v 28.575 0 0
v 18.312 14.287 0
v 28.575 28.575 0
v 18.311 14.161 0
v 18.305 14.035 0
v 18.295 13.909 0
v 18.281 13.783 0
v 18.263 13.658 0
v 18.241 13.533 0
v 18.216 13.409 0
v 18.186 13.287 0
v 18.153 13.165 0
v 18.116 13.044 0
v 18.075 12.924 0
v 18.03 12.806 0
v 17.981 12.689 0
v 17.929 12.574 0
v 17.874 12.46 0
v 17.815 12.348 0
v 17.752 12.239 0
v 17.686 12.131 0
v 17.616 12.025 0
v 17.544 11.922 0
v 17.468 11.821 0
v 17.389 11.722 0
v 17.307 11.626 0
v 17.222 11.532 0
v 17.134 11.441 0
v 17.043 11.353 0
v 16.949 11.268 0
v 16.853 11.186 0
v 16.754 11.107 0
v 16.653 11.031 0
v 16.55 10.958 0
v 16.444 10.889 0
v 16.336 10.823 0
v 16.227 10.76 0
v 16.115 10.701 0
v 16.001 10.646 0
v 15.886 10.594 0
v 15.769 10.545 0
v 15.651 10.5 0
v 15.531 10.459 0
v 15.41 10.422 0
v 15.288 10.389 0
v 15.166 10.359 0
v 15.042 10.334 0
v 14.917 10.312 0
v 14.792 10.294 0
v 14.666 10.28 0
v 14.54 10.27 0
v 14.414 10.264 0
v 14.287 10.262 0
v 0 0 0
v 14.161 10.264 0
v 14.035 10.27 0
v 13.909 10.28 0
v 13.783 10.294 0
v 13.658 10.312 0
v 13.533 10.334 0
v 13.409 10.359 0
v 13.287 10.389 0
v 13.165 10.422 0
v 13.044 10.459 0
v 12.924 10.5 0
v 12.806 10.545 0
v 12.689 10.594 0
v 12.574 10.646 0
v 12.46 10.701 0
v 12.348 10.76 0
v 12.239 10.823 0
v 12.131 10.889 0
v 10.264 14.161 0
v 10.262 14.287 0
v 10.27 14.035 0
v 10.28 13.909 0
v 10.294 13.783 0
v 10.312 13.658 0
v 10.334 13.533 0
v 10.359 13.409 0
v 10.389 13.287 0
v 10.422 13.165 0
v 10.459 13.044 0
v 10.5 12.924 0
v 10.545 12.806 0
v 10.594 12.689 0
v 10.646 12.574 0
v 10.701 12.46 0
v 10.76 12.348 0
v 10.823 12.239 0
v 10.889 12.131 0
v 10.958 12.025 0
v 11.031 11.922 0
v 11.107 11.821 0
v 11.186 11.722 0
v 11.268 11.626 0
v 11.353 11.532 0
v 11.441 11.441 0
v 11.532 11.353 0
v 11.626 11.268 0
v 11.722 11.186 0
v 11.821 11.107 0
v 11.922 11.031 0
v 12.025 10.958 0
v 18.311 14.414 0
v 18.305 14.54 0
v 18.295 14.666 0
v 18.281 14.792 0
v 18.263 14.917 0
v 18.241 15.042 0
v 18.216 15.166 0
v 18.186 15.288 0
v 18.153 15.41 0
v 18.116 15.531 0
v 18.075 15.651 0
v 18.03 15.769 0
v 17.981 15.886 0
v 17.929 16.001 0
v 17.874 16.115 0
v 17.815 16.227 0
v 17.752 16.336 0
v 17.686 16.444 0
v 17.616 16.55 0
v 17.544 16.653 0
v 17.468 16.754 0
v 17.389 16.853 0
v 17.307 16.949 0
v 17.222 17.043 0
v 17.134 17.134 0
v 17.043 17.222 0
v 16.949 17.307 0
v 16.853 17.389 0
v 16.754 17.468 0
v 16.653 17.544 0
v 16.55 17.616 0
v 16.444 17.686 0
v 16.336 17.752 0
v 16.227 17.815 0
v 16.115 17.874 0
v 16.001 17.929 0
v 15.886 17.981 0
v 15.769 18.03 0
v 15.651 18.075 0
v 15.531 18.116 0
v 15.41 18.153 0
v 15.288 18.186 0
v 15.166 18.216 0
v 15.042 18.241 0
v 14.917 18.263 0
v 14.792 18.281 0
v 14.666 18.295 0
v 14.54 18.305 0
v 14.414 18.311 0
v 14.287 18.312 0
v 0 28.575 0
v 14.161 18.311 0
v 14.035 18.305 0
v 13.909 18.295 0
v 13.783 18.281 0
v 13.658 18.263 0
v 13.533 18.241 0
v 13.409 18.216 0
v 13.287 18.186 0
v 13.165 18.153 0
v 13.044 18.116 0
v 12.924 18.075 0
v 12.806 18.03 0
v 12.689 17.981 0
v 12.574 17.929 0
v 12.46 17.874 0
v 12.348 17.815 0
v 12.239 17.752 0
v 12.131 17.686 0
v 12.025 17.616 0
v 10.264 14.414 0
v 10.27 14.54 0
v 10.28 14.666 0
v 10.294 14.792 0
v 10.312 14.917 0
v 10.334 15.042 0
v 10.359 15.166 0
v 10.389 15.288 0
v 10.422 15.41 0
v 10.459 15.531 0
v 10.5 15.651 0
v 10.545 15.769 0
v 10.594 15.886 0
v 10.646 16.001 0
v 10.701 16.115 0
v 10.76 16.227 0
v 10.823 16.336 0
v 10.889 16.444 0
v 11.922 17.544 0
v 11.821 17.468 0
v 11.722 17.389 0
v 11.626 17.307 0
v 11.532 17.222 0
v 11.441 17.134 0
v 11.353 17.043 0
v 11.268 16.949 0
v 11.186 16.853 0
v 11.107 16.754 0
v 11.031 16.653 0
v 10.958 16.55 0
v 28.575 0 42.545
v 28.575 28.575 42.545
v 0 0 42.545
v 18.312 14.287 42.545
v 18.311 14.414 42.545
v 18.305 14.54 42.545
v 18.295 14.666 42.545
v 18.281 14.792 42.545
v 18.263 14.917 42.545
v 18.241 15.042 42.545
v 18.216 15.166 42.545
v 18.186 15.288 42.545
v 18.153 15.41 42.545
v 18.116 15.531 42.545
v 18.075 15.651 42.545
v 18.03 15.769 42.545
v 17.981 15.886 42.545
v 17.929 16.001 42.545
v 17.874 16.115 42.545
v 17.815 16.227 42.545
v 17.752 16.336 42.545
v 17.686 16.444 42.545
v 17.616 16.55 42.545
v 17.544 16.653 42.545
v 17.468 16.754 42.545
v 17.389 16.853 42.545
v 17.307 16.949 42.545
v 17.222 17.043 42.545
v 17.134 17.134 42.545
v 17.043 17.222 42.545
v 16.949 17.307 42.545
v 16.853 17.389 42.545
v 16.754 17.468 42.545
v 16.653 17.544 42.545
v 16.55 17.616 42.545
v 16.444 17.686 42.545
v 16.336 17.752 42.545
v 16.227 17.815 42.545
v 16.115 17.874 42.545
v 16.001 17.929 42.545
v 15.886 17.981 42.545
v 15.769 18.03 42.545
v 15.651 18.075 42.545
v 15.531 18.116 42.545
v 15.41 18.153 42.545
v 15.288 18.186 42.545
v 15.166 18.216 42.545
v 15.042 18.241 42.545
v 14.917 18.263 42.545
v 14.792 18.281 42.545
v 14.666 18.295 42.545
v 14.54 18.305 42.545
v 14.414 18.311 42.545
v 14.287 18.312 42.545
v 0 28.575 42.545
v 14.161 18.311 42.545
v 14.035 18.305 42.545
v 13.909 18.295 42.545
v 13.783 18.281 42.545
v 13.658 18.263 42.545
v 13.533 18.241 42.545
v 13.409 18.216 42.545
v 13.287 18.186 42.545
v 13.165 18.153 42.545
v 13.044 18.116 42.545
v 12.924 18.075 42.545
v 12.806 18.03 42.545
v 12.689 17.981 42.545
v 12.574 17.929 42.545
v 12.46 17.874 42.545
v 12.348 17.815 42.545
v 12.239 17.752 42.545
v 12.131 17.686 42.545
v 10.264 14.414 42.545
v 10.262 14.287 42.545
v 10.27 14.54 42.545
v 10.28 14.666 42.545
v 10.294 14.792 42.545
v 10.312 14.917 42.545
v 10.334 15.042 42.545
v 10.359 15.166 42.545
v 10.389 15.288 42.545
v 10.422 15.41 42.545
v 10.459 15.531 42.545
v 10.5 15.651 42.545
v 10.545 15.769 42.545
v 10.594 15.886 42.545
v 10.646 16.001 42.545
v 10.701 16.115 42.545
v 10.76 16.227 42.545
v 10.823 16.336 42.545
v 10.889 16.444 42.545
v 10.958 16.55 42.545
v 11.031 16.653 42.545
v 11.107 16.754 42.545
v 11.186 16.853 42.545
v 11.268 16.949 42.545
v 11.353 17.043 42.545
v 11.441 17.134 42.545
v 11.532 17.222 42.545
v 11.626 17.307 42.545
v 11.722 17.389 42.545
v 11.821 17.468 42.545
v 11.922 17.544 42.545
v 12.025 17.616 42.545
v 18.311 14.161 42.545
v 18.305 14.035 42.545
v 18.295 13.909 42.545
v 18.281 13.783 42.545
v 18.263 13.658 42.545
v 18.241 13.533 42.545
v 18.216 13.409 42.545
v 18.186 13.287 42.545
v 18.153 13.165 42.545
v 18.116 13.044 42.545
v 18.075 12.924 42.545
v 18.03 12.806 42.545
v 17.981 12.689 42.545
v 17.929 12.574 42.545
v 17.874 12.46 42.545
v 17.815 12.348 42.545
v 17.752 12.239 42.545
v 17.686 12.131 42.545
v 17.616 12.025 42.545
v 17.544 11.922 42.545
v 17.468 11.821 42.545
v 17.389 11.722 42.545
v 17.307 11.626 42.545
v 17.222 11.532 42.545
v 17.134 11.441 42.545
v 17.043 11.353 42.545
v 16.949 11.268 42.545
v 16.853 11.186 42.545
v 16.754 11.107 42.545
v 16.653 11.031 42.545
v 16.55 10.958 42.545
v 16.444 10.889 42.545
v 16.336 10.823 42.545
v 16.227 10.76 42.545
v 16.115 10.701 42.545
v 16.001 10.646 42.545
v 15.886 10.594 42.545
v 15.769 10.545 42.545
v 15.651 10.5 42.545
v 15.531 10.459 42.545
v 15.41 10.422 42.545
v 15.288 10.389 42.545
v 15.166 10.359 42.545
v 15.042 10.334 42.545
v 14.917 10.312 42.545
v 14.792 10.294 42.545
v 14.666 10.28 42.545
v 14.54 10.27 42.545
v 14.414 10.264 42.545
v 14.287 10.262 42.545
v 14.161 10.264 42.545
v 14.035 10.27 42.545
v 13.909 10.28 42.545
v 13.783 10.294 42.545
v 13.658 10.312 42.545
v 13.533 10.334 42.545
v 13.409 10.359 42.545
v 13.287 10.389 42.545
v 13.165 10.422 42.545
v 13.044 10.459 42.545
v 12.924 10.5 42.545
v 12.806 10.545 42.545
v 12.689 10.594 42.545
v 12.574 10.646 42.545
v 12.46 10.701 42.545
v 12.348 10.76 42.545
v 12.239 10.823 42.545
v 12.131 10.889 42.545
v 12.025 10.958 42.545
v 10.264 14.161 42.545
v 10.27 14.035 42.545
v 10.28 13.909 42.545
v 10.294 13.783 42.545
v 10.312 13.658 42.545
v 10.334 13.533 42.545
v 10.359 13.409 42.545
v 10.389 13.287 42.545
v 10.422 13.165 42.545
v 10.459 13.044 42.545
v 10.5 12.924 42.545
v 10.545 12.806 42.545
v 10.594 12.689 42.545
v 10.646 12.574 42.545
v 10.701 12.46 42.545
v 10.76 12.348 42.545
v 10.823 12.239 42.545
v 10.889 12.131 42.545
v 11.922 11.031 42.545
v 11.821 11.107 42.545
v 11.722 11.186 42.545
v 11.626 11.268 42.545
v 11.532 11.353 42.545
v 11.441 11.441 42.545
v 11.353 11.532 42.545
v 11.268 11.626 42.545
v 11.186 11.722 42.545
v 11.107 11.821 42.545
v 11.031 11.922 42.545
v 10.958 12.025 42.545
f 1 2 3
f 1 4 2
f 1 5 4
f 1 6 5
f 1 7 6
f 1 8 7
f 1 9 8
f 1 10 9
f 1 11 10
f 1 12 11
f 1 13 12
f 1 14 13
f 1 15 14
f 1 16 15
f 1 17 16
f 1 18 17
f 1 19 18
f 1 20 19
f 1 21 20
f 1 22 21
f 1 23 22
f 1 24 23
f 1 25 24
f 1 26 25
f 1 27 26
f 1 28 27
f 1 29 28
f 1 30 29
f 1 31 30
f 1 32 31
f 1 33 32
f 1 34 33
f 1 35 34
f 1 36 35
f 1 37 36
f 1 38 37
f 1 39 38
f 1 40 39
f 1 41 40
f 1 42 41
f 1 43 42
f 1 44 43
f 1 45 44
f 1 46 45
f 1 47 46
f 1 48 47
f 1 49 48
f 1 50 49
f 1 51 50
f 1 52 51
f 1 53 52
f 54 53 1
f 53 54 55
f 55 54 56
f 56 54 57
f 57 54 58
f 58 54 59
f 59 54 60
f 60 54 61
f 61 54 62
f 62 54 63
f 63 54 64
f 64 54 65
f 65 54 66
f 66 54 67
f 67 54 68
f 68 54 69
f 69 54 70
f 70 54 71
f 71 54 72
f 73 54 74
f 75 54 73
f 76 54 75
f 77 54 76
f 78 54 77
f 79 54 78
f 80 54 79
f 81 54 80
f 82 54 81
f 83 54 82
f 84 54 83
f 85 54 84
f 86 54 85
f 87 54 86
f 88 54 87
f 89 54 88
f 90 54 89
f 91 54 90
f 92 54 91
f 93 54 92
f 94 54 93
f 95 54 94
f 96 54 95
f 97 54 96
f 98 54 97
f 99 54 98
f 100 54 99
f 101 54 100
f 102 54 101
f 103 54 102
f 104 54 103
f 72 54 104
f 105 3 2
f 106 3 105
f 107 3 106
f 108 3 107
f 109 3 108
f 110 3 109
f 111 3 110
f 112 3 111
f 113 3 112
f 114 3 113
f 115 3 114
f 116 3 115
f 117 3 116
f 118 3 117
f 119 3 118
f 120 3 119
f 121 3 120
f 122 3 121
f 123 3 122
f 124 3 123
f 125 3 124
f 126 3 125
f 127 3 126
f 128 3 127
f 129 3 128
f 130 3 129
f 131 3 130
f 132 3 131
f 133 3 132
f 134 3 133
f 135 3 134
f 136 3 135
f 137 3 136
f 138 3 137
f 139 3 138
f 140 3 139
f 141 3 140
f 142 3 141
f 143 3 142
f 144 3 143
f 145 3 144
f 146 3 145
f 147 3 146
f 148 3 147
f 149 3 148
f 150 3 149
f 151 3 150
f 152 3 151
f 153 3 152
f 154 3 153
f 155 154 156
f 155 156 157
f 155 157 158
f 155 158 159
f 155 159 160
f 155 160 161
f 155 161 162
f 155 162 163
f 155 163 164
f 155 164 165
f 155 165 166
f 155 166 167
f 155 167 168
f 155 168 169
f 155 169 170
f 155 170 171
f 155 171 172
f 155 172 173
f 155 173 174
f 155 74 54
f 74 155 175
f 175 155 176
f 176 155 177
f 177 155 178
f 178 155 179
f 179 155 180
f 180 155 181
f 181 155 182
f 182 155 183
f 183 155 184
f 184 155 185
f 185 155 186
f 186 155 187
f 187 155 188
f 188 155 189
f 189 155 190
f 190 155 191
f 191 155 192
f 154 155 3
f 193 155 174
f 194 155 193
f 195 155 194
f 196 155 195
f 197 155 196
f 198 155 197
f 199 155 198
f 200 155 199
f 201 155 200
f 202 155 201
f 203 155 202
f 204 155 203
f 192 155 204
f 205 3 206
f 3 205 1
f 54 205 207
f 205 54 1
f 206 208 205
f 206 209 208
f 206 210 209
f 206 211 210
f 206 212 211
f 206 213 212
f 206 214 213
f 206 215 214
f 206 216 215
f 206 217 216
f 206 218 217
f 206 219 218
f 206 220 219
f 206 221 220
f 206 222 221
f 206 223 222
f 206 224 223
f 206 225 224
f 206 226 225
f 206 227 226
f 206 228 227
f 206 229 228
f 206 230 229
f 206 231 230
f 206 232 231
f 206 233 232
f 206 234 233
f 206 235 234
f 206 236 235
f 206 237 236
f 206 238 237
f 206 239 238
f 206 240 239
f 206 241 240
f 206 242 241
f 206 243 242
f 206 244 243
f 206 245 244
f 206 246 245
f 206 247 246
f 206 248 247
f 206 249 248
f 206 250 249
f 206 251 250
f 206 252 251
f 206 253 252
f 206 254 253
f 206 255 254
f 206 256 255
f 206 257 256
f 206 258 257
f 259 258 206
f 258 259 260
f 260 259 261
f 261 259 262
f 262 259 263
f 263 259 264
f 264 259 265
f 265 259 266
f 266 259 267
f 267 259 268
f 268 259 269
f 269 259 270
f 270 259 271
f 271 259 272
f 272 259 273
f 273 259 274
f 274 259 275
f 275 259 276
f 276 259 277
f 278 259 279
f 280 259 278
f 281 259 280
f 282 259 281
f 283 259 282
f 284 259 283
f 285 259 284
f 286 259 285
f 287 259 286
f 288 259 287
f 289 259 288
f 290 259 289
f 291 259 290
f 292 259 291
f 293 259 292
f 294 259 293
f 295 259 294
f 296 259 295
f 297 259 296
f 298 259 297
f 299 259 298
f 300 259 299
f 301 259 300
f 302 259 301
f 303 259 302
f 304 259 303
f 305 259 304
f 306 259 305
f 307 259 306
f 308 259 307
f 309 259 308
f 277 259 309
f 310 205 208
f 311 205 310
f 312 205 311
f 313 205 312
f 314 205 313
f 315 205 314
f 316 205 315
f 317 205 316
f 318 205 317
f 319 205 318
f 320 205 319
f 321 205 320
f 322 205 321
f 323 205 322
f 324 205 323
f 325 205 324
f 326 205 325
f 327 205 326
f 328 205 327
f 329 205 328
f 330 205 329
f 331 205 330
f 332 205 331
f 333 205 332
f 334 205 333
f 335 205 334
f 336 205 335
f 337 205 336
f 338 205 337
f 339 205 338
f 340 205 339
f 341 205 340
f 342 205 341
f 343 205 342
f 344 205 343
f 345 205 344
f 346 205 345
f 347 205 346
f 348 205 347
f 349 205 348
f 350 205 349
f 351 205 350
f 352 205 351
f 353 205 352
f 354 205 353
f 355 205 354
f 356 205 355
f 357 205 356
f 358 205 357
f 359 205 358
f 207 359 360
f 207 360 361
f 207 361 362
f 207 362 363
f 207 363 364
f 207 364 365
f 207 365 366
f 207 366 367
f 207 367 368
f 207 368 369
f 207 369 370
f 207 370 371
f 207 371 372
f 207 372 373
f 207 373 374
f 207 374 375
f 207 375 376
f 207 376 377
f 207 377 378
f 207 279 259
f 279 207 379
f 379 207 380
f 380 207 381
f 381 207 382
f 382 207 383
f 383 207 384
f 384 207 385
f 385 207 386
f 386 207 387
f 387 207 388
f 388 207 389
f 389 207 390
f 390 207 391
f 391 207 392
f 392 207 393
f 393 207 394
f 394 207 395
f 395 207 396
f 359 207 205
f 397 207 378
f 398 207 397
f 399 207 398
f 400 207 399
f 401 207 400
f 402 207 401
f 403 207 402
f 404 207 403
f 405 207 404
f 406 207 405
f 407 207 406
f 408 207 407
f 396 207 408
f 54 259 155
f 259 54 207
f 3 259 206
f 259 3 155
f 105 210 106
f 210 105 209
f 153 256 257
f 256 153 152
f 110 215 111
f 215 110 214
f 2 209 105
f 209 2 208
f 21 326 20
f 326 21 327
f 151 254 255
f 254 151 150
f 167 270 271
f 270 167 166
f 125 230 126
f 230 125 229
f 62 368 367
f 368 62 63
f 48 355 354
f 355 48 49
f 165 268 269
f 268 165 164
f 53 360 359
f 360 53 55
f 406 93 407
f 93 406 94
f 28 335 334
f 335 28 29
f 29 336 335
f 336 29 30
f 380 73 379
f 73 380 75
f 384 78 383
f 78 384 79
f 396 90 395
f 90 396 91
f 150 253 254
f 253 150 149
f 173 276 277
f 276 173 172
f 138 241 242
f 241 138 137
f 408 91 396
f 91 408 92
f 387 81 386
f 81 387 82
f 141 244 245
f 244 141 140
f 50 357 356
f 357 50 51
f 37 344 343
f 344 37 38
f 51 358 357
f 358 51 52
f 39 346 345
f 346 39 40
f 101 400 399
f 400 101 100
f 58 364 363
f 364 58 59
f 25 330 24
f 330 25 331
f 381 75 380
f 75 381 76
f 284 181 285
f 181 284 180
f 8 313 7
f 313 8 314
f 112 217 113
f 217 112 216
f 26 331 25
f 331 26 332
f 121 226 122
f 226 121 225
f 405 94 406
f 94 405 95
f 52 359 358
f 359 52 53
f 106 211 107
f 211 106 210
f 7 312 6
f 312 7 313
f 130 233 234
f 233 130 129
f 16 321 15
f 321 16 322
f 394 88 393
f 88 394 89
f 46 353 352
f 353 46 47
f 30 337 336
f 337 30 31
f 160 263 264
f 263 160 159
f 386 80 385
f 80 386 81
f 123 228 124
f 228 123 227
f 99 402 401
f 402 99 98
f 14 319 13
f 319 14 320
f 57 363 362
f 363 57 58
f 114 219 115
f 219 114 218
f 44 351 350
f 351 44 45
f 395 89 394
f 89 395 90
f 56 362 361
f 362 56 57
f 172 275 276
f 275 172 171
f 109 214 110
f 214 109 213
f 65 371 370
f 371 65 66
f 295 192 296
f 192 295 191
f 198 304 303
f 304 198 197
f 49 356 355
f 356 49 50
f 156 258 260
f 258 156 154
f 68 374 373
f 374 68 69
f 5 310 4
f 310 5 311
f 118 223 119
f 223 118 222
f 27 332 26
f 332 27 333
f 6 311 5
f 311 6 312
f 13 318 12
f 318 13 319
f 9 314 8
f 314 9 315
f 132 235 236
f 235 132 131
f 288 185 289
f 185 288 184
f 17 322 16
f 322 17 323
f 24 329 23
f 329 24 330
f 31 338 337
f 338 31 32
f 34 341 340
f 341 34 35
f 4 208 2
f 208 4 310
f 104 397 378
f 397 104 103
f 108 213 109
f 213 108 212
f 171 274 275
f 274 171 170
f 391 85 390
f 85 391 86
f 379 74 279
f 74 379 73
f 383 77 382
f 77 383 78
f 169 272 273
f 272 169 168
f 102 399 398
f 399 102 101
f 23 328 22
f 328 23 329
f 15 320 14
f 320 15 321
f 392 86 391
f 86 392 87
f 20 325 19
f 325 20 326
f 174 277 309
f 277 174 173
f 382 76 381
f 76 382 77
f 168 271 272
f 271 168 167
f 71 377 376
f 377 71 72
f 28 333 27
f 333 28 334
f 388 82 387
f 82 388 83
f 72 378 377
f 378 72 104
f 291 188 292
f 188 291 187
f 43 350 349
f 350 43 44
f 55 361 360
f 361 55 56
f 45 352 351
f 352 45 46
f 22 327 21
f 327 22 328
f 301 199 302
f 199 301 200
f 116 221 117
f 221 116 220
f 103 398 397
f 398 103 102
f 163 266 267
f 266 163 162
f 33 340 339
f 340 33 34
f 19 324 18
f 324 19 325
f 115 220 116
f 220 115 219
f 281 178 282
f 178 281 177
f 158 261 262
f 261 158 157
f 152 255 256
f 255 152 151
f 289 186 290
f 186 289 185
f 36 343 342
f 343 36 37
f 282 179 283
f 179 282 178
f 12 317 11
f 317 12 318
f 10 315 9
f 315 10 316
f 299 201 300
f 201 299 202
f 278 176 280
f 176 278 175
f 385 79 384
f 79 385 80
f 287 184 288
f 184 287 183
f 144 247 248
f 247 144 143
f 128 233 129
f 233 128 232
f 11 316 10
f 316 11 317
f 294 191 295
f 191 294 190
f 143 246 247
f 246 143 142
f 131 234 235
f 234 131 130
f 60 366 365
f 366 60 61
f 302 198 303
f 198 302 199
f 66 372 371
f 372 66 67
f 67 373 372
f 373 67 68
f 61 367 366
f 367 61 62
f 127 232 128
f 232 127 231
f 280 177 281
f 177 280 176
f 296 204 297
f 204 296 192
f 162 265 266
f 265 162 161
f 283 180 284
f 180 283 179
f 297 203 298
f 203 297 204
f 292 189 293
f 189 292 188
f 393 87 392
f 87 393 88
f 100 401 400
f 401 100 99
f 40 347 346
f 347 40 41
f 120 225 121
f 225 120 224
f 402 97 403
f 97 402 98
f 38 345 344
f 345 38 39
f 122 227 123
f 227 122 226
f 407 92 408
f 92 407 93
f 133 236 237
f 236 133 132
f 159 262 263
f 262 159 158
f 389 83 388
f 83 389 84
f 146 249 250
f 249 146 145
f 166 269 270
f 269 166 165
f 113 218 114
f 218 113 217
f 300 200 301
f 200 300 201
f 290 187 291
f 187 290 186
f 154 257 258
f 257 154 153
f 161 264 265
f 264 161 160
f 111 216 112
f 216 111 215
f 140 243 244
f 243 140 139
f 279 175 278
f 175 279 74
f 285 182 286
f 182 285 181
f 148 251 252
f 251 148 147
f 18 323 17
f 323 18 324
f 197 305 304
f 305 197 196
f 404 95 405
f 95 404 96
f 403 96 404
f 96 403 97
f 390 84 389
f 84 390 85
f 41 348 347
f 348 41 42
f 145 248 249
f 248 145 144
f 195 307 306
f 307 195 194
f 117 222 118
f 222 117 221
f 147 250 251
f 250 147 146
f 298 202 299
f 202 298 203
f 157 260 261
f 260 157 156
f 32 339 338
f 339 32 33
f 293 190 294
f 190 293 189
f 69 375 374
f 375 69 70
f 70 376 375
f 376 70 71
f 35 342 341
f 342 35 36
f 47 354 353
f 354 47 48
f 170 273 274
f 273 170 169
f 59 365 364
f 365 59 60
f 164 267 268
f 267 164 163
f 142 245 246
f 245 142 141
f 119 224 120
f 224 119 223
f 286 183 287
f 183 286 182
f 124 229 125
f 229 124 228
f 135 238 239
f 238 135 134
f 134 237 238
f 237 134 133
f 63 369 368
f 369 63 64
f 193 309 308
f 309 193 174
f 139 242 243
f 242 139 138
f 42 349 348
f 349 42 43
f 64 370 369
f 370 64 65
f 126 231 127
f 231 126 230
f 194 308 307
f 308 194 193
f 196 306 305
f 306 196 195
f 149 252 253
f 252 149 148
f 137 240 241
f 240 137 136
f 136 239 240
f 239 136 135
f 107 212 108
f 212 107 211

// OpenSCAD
width = 28.575;
depth = 28.575;
height = 42.545;
bolt = 8.05;

#difference()
{
linear_extrude(height = height )
{
	polygon(points=[[0, 0],[width, 0],[width, depth], [0, depth]]);

}

linear_extrude(height = height)
{
	translate([width/2, depth/2,0])
	{
		circle($fn = 200, r = bolt/2);
	}
}
}
